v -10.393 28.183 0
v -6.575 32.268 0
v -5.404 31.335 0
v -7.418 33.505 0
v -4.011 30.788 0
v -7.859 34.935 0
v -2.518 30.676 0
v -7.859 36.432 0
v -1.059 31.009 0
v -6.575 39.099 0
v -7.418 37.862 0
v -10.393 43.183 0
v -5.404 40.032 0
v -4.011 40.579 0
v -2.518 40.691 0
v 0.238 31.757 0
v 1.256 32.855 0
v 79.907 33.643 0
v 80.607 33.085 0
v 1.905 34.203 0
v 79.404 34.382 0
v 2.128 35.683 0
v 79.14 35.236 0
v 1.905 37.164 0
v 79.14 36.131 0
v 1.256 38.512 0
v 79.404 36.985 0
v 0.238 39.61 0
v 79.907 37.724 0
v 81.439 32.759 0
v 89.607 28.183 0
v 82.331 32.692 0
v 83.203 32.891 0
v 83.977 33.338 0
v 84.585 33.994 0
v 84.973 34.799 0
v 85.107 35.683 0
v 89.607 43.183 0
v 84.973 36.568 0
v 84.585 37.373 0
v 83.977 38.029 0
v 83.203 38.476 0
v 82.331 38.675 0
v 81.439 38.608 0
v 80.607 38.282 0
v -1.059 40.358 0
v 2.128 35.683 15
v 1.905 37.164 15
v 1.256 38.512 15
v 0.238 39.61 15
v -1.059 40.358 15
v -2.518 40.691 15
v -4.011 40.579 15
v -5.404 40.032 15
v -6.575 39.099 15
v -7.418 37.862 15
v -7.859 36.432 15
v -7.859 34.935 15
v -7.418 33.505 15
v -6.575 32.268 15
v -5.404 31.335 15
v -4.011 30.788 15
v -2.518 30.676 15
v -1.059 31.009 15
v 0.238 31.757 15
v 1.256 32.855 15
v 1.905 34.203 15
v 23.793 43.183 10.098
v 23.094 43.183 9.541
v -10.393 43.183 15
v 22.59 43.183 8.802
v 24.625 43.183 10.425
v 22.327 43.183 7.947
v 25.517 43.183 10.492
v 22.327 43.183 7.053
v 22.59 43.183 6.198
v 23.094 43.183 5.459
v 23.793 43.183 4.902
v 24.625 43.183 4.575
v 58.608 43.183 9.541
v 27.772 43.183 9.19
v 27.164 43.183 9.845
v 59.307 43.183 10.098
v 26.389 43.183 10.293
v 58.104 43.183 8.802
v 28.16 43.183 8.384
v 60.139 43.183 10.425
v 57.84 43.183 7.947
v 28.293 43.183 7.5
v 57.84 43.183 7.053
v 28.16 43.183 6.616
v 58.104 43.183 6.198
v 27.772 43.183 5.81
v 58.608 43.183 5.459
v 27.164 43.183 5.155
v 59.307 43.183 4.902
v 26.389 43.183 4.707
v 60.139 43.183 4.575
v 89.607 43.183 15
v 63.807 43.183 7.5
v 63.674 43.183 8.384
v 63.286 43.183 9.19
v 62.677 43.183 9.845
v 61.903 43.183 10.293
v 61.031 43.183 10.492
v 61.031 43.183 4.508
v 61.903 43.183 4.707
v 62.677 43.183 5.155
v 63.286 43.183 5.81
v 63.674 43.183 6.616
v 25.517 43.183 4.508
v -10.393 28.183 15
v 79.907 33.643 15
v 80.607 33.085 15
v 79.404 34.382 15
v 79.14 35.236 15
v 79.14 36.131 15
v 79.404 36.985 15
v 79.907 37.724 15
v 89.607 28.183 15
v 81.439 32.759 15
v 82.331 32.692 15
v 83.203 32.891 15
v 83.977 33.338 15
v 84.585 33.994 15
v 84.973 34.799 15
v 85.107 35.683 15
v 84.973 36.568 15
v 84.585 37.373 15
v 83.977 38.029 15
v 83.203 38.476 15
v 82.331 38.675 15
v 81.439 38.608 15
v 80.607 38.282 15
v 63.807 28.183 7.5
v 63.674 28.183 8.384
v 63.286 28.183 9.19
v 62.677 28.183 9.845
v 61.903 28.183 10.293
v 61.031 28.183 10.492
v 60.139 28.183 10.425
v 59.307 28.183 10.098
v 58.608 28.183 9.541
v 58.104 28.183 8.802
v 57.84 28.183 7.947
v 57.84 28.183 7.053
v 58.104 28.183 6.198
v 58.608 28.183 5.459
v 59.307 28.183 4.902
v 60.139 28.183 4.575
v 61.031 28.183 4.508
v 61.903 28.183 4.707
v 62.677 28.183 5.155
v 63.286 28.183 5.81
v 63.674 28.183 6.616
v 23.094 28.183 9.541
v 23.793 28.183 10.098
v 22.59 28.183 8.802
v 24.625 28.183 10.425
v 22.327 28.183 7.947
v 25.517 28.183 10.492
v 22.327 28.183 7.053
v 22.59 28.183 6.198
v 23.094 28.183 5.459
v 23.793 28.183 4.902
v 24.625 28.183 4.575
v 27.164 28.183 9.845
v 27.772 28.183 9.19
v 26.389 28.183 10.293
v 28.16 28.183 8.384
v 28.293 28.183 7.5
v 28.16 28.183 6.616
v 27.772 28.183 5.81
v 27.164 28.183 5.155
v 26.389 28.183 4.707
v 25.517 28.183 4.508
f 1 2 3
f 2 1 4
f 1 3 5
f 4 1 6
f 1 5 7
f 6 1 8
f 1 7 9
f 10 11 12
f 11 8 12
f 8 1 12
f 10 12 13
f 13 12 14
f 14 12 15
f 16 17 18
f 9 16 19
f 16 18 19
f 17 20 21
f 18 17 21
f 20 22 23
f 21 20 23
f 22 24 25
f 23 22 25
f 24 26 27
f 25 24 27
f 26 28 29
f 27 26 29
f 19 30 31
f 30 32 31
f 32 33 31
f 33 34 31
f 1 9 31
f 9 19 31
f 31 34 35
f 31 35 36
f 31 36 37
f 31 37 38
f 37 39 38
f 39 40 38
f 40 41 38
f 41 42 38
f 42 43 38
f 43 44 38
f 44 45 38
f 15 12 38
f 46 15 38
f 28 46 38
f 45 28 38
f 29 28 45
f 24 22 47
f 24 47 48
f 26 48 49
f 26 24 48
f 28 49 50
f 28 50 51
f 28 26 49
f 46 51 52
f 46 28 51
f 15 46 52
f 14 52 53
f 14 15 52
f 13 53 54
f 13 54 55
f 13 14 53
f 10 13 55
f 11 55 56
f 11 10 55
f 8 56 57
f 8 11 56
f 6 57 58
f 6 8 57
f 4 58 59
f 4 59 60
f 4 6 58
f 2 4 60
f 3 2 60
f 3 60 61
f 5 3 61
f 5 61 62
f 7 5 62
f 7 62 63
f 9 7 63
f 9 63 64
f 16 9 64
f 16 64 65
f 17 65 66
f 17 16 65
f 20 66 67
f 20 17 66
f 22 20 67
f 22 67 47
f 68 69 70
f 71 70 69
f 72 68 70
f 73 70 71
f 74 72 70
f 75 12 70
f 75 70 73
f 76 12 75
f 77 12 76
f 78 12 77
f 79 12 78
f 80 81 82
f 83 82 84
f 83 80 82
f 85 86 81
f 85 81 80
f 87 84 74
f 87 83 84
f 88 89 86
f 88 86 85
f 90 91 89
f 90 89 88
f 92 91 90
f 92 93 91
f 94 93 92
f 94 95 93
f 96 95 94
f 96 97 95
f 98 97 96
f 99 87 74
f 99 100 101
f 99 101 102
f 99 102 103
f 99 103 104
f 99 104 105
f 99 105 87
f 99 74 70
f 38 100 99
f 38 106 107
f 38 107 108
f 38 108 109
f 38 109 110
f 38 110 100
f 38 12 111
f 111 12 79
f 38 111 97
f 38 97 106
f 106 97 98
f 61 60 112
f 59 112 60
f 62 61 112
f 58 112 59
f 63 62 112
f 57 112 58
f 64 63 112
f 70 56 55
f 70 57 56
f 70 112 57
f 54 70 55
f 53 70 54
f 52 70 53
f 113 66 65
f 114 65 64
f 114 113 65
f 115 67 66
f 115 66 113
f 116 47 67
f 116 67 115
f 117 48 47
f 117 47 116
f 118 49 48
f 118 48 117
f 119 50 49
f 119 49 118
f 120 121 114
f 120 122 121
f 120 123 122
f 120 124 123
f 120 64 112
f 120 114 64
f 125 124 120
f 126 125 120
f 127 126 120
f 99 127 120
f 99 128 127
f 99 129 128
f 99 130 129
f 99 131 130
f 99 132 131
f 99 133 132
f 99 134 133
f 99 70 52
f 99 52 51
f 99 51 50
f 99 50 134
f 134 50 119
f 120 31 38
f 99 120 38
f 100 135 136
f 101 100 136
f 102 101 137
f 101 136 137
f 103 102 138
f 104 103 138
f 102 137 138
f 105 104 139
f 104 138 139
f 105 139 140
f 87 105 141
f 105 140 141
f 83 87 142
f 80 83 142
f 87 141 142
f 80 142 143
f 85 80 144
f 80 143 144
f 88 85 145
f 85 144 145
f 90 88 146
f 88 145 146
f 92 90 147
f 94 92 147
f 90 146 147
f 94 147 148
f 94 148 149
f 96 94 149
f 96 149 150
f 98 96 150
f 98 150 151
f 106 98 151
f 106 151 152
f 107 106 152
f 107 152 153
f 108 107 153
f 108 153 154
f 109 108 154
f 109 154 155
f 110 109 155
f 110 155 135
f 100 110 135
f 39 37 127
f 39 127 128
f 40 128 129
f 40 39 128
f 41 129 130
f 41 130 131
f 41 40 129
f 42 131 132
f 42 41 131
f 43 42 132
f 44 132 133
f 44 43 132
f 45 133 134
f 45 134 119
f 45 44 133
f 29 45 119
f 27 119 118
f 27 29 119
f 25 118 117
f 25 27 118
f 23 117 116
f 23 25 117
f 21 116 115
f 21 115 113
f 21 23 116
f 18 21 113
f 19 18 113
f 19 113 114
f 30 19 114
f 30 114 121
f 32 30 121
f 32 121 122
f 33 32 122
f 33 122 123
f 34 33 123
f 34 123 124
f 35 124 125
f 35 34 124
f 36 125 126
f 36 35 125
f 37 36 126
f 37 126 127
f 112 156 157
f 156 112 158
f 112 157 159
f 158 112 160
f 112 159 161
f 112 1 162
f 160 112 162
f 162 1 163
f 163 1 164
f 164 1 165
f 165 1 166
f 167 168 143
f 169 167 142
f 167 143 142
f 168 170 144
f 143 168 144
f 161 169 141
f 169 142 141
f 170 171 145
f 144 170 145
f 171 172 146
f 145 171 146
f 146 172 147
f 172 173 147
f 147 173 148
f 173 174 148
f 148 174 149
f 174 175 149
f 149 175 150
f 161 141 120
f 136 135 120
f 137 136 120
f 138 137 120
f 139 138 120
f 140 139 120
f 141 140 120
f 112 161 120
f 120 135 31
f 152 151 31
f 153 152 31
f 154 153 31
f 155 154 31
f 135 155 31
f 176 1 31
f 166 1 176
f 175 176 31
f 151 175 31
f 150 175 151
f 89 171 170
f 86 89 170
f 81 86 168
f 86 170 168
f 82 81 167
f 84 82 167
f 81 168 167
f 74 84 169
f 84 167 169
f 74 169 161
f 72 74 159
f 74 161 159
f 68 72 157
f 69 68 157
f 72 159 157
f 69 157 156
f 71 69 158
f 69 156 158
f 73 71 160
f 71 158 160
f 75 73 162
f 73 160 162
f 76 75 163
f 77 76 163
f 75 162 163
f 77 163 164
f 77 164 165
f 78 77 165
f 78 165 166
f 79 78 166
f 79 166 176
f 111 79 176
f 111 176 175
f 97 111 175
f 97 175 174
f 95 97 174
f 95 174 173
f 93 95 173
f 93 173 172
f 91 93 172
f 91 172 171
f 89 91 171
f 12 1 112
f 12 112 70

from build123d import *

# Parameters (mm, degrees)
SKETCH_1_W          = 100
SKETCH_1_H          = 15
SKETCH_1_R          = 3
SKETCH_1_R_2        = 5.021699513
EXTRUDE_1_DEPTH     = 15
CUT_EXTRUDE_1_REACH = 94.083
SKETCH_2_R          = 3


with BuildPart() as part:
    # 草圖1 → 填料-伸長1 (new body)
    with BuildSketch(Plane.XY):
        with Locations((39.606552155, 35.683485423)):
            Rectangle(SKETCH_1_W, SKETCH_1_H)
        with Locations((82.106552155, 35.683485423)):
            Circle(SKETCH_1_R, mode=Mode.SUBTRACT)
        with Locations((-2.893447845, 35.683485423)):
            Circle(SKETCH_1_R_2, mode=Mode.SUBTRACT)
    extrude(amount=EXTRUDE_1_DEPTH)

    # 草圖2 → 除料-伸長1 (cut, up to next)
    with BuildSketch(Plane.XZ.offset(-28.183485423), mode=Mode.PRIVATE) as cut_extrude_1_sk1:
        with Locations((60.806805045, 7.5)):
            Circle(SKETCH_2_R)
    cut_extrude_1_tool1 = extrude(cut_extrude_1_sk1.sketch, amount=-CUT_EXTRUDE_1_REACH, mode=Mode.PRIVATE) & part.part
    # 草圖2 → 除料-伸長1 (cut, up to next)
    with BuildSketch(Plane.XZ.offset(-28.183485423), mode=Mode.PRIVATE) as cut_extrude_1_sk2:
        with Locations((25.293048558, 7.5)):
            Circle(SKETCH_2_R)
    cut_extrude_1_tool2 = extrude(cut_extrude_1_sk2.sketch, amount=-CUT_EXTRUDE_1_REACH, mode=Mode.PRIVATE) & part.part
    add(cut_extrude_1_tool1.solids().sort_by_distance((60.806805, 28.183485, 7.5))[0], mode=Mode.SUBTRACT)
    add(cut_extrude_1_tool2.solids().sort_by_distance((25.293049, 28.183485, 7.5))[0], mode=Mode.SUBTRACT)


solid = part.part
